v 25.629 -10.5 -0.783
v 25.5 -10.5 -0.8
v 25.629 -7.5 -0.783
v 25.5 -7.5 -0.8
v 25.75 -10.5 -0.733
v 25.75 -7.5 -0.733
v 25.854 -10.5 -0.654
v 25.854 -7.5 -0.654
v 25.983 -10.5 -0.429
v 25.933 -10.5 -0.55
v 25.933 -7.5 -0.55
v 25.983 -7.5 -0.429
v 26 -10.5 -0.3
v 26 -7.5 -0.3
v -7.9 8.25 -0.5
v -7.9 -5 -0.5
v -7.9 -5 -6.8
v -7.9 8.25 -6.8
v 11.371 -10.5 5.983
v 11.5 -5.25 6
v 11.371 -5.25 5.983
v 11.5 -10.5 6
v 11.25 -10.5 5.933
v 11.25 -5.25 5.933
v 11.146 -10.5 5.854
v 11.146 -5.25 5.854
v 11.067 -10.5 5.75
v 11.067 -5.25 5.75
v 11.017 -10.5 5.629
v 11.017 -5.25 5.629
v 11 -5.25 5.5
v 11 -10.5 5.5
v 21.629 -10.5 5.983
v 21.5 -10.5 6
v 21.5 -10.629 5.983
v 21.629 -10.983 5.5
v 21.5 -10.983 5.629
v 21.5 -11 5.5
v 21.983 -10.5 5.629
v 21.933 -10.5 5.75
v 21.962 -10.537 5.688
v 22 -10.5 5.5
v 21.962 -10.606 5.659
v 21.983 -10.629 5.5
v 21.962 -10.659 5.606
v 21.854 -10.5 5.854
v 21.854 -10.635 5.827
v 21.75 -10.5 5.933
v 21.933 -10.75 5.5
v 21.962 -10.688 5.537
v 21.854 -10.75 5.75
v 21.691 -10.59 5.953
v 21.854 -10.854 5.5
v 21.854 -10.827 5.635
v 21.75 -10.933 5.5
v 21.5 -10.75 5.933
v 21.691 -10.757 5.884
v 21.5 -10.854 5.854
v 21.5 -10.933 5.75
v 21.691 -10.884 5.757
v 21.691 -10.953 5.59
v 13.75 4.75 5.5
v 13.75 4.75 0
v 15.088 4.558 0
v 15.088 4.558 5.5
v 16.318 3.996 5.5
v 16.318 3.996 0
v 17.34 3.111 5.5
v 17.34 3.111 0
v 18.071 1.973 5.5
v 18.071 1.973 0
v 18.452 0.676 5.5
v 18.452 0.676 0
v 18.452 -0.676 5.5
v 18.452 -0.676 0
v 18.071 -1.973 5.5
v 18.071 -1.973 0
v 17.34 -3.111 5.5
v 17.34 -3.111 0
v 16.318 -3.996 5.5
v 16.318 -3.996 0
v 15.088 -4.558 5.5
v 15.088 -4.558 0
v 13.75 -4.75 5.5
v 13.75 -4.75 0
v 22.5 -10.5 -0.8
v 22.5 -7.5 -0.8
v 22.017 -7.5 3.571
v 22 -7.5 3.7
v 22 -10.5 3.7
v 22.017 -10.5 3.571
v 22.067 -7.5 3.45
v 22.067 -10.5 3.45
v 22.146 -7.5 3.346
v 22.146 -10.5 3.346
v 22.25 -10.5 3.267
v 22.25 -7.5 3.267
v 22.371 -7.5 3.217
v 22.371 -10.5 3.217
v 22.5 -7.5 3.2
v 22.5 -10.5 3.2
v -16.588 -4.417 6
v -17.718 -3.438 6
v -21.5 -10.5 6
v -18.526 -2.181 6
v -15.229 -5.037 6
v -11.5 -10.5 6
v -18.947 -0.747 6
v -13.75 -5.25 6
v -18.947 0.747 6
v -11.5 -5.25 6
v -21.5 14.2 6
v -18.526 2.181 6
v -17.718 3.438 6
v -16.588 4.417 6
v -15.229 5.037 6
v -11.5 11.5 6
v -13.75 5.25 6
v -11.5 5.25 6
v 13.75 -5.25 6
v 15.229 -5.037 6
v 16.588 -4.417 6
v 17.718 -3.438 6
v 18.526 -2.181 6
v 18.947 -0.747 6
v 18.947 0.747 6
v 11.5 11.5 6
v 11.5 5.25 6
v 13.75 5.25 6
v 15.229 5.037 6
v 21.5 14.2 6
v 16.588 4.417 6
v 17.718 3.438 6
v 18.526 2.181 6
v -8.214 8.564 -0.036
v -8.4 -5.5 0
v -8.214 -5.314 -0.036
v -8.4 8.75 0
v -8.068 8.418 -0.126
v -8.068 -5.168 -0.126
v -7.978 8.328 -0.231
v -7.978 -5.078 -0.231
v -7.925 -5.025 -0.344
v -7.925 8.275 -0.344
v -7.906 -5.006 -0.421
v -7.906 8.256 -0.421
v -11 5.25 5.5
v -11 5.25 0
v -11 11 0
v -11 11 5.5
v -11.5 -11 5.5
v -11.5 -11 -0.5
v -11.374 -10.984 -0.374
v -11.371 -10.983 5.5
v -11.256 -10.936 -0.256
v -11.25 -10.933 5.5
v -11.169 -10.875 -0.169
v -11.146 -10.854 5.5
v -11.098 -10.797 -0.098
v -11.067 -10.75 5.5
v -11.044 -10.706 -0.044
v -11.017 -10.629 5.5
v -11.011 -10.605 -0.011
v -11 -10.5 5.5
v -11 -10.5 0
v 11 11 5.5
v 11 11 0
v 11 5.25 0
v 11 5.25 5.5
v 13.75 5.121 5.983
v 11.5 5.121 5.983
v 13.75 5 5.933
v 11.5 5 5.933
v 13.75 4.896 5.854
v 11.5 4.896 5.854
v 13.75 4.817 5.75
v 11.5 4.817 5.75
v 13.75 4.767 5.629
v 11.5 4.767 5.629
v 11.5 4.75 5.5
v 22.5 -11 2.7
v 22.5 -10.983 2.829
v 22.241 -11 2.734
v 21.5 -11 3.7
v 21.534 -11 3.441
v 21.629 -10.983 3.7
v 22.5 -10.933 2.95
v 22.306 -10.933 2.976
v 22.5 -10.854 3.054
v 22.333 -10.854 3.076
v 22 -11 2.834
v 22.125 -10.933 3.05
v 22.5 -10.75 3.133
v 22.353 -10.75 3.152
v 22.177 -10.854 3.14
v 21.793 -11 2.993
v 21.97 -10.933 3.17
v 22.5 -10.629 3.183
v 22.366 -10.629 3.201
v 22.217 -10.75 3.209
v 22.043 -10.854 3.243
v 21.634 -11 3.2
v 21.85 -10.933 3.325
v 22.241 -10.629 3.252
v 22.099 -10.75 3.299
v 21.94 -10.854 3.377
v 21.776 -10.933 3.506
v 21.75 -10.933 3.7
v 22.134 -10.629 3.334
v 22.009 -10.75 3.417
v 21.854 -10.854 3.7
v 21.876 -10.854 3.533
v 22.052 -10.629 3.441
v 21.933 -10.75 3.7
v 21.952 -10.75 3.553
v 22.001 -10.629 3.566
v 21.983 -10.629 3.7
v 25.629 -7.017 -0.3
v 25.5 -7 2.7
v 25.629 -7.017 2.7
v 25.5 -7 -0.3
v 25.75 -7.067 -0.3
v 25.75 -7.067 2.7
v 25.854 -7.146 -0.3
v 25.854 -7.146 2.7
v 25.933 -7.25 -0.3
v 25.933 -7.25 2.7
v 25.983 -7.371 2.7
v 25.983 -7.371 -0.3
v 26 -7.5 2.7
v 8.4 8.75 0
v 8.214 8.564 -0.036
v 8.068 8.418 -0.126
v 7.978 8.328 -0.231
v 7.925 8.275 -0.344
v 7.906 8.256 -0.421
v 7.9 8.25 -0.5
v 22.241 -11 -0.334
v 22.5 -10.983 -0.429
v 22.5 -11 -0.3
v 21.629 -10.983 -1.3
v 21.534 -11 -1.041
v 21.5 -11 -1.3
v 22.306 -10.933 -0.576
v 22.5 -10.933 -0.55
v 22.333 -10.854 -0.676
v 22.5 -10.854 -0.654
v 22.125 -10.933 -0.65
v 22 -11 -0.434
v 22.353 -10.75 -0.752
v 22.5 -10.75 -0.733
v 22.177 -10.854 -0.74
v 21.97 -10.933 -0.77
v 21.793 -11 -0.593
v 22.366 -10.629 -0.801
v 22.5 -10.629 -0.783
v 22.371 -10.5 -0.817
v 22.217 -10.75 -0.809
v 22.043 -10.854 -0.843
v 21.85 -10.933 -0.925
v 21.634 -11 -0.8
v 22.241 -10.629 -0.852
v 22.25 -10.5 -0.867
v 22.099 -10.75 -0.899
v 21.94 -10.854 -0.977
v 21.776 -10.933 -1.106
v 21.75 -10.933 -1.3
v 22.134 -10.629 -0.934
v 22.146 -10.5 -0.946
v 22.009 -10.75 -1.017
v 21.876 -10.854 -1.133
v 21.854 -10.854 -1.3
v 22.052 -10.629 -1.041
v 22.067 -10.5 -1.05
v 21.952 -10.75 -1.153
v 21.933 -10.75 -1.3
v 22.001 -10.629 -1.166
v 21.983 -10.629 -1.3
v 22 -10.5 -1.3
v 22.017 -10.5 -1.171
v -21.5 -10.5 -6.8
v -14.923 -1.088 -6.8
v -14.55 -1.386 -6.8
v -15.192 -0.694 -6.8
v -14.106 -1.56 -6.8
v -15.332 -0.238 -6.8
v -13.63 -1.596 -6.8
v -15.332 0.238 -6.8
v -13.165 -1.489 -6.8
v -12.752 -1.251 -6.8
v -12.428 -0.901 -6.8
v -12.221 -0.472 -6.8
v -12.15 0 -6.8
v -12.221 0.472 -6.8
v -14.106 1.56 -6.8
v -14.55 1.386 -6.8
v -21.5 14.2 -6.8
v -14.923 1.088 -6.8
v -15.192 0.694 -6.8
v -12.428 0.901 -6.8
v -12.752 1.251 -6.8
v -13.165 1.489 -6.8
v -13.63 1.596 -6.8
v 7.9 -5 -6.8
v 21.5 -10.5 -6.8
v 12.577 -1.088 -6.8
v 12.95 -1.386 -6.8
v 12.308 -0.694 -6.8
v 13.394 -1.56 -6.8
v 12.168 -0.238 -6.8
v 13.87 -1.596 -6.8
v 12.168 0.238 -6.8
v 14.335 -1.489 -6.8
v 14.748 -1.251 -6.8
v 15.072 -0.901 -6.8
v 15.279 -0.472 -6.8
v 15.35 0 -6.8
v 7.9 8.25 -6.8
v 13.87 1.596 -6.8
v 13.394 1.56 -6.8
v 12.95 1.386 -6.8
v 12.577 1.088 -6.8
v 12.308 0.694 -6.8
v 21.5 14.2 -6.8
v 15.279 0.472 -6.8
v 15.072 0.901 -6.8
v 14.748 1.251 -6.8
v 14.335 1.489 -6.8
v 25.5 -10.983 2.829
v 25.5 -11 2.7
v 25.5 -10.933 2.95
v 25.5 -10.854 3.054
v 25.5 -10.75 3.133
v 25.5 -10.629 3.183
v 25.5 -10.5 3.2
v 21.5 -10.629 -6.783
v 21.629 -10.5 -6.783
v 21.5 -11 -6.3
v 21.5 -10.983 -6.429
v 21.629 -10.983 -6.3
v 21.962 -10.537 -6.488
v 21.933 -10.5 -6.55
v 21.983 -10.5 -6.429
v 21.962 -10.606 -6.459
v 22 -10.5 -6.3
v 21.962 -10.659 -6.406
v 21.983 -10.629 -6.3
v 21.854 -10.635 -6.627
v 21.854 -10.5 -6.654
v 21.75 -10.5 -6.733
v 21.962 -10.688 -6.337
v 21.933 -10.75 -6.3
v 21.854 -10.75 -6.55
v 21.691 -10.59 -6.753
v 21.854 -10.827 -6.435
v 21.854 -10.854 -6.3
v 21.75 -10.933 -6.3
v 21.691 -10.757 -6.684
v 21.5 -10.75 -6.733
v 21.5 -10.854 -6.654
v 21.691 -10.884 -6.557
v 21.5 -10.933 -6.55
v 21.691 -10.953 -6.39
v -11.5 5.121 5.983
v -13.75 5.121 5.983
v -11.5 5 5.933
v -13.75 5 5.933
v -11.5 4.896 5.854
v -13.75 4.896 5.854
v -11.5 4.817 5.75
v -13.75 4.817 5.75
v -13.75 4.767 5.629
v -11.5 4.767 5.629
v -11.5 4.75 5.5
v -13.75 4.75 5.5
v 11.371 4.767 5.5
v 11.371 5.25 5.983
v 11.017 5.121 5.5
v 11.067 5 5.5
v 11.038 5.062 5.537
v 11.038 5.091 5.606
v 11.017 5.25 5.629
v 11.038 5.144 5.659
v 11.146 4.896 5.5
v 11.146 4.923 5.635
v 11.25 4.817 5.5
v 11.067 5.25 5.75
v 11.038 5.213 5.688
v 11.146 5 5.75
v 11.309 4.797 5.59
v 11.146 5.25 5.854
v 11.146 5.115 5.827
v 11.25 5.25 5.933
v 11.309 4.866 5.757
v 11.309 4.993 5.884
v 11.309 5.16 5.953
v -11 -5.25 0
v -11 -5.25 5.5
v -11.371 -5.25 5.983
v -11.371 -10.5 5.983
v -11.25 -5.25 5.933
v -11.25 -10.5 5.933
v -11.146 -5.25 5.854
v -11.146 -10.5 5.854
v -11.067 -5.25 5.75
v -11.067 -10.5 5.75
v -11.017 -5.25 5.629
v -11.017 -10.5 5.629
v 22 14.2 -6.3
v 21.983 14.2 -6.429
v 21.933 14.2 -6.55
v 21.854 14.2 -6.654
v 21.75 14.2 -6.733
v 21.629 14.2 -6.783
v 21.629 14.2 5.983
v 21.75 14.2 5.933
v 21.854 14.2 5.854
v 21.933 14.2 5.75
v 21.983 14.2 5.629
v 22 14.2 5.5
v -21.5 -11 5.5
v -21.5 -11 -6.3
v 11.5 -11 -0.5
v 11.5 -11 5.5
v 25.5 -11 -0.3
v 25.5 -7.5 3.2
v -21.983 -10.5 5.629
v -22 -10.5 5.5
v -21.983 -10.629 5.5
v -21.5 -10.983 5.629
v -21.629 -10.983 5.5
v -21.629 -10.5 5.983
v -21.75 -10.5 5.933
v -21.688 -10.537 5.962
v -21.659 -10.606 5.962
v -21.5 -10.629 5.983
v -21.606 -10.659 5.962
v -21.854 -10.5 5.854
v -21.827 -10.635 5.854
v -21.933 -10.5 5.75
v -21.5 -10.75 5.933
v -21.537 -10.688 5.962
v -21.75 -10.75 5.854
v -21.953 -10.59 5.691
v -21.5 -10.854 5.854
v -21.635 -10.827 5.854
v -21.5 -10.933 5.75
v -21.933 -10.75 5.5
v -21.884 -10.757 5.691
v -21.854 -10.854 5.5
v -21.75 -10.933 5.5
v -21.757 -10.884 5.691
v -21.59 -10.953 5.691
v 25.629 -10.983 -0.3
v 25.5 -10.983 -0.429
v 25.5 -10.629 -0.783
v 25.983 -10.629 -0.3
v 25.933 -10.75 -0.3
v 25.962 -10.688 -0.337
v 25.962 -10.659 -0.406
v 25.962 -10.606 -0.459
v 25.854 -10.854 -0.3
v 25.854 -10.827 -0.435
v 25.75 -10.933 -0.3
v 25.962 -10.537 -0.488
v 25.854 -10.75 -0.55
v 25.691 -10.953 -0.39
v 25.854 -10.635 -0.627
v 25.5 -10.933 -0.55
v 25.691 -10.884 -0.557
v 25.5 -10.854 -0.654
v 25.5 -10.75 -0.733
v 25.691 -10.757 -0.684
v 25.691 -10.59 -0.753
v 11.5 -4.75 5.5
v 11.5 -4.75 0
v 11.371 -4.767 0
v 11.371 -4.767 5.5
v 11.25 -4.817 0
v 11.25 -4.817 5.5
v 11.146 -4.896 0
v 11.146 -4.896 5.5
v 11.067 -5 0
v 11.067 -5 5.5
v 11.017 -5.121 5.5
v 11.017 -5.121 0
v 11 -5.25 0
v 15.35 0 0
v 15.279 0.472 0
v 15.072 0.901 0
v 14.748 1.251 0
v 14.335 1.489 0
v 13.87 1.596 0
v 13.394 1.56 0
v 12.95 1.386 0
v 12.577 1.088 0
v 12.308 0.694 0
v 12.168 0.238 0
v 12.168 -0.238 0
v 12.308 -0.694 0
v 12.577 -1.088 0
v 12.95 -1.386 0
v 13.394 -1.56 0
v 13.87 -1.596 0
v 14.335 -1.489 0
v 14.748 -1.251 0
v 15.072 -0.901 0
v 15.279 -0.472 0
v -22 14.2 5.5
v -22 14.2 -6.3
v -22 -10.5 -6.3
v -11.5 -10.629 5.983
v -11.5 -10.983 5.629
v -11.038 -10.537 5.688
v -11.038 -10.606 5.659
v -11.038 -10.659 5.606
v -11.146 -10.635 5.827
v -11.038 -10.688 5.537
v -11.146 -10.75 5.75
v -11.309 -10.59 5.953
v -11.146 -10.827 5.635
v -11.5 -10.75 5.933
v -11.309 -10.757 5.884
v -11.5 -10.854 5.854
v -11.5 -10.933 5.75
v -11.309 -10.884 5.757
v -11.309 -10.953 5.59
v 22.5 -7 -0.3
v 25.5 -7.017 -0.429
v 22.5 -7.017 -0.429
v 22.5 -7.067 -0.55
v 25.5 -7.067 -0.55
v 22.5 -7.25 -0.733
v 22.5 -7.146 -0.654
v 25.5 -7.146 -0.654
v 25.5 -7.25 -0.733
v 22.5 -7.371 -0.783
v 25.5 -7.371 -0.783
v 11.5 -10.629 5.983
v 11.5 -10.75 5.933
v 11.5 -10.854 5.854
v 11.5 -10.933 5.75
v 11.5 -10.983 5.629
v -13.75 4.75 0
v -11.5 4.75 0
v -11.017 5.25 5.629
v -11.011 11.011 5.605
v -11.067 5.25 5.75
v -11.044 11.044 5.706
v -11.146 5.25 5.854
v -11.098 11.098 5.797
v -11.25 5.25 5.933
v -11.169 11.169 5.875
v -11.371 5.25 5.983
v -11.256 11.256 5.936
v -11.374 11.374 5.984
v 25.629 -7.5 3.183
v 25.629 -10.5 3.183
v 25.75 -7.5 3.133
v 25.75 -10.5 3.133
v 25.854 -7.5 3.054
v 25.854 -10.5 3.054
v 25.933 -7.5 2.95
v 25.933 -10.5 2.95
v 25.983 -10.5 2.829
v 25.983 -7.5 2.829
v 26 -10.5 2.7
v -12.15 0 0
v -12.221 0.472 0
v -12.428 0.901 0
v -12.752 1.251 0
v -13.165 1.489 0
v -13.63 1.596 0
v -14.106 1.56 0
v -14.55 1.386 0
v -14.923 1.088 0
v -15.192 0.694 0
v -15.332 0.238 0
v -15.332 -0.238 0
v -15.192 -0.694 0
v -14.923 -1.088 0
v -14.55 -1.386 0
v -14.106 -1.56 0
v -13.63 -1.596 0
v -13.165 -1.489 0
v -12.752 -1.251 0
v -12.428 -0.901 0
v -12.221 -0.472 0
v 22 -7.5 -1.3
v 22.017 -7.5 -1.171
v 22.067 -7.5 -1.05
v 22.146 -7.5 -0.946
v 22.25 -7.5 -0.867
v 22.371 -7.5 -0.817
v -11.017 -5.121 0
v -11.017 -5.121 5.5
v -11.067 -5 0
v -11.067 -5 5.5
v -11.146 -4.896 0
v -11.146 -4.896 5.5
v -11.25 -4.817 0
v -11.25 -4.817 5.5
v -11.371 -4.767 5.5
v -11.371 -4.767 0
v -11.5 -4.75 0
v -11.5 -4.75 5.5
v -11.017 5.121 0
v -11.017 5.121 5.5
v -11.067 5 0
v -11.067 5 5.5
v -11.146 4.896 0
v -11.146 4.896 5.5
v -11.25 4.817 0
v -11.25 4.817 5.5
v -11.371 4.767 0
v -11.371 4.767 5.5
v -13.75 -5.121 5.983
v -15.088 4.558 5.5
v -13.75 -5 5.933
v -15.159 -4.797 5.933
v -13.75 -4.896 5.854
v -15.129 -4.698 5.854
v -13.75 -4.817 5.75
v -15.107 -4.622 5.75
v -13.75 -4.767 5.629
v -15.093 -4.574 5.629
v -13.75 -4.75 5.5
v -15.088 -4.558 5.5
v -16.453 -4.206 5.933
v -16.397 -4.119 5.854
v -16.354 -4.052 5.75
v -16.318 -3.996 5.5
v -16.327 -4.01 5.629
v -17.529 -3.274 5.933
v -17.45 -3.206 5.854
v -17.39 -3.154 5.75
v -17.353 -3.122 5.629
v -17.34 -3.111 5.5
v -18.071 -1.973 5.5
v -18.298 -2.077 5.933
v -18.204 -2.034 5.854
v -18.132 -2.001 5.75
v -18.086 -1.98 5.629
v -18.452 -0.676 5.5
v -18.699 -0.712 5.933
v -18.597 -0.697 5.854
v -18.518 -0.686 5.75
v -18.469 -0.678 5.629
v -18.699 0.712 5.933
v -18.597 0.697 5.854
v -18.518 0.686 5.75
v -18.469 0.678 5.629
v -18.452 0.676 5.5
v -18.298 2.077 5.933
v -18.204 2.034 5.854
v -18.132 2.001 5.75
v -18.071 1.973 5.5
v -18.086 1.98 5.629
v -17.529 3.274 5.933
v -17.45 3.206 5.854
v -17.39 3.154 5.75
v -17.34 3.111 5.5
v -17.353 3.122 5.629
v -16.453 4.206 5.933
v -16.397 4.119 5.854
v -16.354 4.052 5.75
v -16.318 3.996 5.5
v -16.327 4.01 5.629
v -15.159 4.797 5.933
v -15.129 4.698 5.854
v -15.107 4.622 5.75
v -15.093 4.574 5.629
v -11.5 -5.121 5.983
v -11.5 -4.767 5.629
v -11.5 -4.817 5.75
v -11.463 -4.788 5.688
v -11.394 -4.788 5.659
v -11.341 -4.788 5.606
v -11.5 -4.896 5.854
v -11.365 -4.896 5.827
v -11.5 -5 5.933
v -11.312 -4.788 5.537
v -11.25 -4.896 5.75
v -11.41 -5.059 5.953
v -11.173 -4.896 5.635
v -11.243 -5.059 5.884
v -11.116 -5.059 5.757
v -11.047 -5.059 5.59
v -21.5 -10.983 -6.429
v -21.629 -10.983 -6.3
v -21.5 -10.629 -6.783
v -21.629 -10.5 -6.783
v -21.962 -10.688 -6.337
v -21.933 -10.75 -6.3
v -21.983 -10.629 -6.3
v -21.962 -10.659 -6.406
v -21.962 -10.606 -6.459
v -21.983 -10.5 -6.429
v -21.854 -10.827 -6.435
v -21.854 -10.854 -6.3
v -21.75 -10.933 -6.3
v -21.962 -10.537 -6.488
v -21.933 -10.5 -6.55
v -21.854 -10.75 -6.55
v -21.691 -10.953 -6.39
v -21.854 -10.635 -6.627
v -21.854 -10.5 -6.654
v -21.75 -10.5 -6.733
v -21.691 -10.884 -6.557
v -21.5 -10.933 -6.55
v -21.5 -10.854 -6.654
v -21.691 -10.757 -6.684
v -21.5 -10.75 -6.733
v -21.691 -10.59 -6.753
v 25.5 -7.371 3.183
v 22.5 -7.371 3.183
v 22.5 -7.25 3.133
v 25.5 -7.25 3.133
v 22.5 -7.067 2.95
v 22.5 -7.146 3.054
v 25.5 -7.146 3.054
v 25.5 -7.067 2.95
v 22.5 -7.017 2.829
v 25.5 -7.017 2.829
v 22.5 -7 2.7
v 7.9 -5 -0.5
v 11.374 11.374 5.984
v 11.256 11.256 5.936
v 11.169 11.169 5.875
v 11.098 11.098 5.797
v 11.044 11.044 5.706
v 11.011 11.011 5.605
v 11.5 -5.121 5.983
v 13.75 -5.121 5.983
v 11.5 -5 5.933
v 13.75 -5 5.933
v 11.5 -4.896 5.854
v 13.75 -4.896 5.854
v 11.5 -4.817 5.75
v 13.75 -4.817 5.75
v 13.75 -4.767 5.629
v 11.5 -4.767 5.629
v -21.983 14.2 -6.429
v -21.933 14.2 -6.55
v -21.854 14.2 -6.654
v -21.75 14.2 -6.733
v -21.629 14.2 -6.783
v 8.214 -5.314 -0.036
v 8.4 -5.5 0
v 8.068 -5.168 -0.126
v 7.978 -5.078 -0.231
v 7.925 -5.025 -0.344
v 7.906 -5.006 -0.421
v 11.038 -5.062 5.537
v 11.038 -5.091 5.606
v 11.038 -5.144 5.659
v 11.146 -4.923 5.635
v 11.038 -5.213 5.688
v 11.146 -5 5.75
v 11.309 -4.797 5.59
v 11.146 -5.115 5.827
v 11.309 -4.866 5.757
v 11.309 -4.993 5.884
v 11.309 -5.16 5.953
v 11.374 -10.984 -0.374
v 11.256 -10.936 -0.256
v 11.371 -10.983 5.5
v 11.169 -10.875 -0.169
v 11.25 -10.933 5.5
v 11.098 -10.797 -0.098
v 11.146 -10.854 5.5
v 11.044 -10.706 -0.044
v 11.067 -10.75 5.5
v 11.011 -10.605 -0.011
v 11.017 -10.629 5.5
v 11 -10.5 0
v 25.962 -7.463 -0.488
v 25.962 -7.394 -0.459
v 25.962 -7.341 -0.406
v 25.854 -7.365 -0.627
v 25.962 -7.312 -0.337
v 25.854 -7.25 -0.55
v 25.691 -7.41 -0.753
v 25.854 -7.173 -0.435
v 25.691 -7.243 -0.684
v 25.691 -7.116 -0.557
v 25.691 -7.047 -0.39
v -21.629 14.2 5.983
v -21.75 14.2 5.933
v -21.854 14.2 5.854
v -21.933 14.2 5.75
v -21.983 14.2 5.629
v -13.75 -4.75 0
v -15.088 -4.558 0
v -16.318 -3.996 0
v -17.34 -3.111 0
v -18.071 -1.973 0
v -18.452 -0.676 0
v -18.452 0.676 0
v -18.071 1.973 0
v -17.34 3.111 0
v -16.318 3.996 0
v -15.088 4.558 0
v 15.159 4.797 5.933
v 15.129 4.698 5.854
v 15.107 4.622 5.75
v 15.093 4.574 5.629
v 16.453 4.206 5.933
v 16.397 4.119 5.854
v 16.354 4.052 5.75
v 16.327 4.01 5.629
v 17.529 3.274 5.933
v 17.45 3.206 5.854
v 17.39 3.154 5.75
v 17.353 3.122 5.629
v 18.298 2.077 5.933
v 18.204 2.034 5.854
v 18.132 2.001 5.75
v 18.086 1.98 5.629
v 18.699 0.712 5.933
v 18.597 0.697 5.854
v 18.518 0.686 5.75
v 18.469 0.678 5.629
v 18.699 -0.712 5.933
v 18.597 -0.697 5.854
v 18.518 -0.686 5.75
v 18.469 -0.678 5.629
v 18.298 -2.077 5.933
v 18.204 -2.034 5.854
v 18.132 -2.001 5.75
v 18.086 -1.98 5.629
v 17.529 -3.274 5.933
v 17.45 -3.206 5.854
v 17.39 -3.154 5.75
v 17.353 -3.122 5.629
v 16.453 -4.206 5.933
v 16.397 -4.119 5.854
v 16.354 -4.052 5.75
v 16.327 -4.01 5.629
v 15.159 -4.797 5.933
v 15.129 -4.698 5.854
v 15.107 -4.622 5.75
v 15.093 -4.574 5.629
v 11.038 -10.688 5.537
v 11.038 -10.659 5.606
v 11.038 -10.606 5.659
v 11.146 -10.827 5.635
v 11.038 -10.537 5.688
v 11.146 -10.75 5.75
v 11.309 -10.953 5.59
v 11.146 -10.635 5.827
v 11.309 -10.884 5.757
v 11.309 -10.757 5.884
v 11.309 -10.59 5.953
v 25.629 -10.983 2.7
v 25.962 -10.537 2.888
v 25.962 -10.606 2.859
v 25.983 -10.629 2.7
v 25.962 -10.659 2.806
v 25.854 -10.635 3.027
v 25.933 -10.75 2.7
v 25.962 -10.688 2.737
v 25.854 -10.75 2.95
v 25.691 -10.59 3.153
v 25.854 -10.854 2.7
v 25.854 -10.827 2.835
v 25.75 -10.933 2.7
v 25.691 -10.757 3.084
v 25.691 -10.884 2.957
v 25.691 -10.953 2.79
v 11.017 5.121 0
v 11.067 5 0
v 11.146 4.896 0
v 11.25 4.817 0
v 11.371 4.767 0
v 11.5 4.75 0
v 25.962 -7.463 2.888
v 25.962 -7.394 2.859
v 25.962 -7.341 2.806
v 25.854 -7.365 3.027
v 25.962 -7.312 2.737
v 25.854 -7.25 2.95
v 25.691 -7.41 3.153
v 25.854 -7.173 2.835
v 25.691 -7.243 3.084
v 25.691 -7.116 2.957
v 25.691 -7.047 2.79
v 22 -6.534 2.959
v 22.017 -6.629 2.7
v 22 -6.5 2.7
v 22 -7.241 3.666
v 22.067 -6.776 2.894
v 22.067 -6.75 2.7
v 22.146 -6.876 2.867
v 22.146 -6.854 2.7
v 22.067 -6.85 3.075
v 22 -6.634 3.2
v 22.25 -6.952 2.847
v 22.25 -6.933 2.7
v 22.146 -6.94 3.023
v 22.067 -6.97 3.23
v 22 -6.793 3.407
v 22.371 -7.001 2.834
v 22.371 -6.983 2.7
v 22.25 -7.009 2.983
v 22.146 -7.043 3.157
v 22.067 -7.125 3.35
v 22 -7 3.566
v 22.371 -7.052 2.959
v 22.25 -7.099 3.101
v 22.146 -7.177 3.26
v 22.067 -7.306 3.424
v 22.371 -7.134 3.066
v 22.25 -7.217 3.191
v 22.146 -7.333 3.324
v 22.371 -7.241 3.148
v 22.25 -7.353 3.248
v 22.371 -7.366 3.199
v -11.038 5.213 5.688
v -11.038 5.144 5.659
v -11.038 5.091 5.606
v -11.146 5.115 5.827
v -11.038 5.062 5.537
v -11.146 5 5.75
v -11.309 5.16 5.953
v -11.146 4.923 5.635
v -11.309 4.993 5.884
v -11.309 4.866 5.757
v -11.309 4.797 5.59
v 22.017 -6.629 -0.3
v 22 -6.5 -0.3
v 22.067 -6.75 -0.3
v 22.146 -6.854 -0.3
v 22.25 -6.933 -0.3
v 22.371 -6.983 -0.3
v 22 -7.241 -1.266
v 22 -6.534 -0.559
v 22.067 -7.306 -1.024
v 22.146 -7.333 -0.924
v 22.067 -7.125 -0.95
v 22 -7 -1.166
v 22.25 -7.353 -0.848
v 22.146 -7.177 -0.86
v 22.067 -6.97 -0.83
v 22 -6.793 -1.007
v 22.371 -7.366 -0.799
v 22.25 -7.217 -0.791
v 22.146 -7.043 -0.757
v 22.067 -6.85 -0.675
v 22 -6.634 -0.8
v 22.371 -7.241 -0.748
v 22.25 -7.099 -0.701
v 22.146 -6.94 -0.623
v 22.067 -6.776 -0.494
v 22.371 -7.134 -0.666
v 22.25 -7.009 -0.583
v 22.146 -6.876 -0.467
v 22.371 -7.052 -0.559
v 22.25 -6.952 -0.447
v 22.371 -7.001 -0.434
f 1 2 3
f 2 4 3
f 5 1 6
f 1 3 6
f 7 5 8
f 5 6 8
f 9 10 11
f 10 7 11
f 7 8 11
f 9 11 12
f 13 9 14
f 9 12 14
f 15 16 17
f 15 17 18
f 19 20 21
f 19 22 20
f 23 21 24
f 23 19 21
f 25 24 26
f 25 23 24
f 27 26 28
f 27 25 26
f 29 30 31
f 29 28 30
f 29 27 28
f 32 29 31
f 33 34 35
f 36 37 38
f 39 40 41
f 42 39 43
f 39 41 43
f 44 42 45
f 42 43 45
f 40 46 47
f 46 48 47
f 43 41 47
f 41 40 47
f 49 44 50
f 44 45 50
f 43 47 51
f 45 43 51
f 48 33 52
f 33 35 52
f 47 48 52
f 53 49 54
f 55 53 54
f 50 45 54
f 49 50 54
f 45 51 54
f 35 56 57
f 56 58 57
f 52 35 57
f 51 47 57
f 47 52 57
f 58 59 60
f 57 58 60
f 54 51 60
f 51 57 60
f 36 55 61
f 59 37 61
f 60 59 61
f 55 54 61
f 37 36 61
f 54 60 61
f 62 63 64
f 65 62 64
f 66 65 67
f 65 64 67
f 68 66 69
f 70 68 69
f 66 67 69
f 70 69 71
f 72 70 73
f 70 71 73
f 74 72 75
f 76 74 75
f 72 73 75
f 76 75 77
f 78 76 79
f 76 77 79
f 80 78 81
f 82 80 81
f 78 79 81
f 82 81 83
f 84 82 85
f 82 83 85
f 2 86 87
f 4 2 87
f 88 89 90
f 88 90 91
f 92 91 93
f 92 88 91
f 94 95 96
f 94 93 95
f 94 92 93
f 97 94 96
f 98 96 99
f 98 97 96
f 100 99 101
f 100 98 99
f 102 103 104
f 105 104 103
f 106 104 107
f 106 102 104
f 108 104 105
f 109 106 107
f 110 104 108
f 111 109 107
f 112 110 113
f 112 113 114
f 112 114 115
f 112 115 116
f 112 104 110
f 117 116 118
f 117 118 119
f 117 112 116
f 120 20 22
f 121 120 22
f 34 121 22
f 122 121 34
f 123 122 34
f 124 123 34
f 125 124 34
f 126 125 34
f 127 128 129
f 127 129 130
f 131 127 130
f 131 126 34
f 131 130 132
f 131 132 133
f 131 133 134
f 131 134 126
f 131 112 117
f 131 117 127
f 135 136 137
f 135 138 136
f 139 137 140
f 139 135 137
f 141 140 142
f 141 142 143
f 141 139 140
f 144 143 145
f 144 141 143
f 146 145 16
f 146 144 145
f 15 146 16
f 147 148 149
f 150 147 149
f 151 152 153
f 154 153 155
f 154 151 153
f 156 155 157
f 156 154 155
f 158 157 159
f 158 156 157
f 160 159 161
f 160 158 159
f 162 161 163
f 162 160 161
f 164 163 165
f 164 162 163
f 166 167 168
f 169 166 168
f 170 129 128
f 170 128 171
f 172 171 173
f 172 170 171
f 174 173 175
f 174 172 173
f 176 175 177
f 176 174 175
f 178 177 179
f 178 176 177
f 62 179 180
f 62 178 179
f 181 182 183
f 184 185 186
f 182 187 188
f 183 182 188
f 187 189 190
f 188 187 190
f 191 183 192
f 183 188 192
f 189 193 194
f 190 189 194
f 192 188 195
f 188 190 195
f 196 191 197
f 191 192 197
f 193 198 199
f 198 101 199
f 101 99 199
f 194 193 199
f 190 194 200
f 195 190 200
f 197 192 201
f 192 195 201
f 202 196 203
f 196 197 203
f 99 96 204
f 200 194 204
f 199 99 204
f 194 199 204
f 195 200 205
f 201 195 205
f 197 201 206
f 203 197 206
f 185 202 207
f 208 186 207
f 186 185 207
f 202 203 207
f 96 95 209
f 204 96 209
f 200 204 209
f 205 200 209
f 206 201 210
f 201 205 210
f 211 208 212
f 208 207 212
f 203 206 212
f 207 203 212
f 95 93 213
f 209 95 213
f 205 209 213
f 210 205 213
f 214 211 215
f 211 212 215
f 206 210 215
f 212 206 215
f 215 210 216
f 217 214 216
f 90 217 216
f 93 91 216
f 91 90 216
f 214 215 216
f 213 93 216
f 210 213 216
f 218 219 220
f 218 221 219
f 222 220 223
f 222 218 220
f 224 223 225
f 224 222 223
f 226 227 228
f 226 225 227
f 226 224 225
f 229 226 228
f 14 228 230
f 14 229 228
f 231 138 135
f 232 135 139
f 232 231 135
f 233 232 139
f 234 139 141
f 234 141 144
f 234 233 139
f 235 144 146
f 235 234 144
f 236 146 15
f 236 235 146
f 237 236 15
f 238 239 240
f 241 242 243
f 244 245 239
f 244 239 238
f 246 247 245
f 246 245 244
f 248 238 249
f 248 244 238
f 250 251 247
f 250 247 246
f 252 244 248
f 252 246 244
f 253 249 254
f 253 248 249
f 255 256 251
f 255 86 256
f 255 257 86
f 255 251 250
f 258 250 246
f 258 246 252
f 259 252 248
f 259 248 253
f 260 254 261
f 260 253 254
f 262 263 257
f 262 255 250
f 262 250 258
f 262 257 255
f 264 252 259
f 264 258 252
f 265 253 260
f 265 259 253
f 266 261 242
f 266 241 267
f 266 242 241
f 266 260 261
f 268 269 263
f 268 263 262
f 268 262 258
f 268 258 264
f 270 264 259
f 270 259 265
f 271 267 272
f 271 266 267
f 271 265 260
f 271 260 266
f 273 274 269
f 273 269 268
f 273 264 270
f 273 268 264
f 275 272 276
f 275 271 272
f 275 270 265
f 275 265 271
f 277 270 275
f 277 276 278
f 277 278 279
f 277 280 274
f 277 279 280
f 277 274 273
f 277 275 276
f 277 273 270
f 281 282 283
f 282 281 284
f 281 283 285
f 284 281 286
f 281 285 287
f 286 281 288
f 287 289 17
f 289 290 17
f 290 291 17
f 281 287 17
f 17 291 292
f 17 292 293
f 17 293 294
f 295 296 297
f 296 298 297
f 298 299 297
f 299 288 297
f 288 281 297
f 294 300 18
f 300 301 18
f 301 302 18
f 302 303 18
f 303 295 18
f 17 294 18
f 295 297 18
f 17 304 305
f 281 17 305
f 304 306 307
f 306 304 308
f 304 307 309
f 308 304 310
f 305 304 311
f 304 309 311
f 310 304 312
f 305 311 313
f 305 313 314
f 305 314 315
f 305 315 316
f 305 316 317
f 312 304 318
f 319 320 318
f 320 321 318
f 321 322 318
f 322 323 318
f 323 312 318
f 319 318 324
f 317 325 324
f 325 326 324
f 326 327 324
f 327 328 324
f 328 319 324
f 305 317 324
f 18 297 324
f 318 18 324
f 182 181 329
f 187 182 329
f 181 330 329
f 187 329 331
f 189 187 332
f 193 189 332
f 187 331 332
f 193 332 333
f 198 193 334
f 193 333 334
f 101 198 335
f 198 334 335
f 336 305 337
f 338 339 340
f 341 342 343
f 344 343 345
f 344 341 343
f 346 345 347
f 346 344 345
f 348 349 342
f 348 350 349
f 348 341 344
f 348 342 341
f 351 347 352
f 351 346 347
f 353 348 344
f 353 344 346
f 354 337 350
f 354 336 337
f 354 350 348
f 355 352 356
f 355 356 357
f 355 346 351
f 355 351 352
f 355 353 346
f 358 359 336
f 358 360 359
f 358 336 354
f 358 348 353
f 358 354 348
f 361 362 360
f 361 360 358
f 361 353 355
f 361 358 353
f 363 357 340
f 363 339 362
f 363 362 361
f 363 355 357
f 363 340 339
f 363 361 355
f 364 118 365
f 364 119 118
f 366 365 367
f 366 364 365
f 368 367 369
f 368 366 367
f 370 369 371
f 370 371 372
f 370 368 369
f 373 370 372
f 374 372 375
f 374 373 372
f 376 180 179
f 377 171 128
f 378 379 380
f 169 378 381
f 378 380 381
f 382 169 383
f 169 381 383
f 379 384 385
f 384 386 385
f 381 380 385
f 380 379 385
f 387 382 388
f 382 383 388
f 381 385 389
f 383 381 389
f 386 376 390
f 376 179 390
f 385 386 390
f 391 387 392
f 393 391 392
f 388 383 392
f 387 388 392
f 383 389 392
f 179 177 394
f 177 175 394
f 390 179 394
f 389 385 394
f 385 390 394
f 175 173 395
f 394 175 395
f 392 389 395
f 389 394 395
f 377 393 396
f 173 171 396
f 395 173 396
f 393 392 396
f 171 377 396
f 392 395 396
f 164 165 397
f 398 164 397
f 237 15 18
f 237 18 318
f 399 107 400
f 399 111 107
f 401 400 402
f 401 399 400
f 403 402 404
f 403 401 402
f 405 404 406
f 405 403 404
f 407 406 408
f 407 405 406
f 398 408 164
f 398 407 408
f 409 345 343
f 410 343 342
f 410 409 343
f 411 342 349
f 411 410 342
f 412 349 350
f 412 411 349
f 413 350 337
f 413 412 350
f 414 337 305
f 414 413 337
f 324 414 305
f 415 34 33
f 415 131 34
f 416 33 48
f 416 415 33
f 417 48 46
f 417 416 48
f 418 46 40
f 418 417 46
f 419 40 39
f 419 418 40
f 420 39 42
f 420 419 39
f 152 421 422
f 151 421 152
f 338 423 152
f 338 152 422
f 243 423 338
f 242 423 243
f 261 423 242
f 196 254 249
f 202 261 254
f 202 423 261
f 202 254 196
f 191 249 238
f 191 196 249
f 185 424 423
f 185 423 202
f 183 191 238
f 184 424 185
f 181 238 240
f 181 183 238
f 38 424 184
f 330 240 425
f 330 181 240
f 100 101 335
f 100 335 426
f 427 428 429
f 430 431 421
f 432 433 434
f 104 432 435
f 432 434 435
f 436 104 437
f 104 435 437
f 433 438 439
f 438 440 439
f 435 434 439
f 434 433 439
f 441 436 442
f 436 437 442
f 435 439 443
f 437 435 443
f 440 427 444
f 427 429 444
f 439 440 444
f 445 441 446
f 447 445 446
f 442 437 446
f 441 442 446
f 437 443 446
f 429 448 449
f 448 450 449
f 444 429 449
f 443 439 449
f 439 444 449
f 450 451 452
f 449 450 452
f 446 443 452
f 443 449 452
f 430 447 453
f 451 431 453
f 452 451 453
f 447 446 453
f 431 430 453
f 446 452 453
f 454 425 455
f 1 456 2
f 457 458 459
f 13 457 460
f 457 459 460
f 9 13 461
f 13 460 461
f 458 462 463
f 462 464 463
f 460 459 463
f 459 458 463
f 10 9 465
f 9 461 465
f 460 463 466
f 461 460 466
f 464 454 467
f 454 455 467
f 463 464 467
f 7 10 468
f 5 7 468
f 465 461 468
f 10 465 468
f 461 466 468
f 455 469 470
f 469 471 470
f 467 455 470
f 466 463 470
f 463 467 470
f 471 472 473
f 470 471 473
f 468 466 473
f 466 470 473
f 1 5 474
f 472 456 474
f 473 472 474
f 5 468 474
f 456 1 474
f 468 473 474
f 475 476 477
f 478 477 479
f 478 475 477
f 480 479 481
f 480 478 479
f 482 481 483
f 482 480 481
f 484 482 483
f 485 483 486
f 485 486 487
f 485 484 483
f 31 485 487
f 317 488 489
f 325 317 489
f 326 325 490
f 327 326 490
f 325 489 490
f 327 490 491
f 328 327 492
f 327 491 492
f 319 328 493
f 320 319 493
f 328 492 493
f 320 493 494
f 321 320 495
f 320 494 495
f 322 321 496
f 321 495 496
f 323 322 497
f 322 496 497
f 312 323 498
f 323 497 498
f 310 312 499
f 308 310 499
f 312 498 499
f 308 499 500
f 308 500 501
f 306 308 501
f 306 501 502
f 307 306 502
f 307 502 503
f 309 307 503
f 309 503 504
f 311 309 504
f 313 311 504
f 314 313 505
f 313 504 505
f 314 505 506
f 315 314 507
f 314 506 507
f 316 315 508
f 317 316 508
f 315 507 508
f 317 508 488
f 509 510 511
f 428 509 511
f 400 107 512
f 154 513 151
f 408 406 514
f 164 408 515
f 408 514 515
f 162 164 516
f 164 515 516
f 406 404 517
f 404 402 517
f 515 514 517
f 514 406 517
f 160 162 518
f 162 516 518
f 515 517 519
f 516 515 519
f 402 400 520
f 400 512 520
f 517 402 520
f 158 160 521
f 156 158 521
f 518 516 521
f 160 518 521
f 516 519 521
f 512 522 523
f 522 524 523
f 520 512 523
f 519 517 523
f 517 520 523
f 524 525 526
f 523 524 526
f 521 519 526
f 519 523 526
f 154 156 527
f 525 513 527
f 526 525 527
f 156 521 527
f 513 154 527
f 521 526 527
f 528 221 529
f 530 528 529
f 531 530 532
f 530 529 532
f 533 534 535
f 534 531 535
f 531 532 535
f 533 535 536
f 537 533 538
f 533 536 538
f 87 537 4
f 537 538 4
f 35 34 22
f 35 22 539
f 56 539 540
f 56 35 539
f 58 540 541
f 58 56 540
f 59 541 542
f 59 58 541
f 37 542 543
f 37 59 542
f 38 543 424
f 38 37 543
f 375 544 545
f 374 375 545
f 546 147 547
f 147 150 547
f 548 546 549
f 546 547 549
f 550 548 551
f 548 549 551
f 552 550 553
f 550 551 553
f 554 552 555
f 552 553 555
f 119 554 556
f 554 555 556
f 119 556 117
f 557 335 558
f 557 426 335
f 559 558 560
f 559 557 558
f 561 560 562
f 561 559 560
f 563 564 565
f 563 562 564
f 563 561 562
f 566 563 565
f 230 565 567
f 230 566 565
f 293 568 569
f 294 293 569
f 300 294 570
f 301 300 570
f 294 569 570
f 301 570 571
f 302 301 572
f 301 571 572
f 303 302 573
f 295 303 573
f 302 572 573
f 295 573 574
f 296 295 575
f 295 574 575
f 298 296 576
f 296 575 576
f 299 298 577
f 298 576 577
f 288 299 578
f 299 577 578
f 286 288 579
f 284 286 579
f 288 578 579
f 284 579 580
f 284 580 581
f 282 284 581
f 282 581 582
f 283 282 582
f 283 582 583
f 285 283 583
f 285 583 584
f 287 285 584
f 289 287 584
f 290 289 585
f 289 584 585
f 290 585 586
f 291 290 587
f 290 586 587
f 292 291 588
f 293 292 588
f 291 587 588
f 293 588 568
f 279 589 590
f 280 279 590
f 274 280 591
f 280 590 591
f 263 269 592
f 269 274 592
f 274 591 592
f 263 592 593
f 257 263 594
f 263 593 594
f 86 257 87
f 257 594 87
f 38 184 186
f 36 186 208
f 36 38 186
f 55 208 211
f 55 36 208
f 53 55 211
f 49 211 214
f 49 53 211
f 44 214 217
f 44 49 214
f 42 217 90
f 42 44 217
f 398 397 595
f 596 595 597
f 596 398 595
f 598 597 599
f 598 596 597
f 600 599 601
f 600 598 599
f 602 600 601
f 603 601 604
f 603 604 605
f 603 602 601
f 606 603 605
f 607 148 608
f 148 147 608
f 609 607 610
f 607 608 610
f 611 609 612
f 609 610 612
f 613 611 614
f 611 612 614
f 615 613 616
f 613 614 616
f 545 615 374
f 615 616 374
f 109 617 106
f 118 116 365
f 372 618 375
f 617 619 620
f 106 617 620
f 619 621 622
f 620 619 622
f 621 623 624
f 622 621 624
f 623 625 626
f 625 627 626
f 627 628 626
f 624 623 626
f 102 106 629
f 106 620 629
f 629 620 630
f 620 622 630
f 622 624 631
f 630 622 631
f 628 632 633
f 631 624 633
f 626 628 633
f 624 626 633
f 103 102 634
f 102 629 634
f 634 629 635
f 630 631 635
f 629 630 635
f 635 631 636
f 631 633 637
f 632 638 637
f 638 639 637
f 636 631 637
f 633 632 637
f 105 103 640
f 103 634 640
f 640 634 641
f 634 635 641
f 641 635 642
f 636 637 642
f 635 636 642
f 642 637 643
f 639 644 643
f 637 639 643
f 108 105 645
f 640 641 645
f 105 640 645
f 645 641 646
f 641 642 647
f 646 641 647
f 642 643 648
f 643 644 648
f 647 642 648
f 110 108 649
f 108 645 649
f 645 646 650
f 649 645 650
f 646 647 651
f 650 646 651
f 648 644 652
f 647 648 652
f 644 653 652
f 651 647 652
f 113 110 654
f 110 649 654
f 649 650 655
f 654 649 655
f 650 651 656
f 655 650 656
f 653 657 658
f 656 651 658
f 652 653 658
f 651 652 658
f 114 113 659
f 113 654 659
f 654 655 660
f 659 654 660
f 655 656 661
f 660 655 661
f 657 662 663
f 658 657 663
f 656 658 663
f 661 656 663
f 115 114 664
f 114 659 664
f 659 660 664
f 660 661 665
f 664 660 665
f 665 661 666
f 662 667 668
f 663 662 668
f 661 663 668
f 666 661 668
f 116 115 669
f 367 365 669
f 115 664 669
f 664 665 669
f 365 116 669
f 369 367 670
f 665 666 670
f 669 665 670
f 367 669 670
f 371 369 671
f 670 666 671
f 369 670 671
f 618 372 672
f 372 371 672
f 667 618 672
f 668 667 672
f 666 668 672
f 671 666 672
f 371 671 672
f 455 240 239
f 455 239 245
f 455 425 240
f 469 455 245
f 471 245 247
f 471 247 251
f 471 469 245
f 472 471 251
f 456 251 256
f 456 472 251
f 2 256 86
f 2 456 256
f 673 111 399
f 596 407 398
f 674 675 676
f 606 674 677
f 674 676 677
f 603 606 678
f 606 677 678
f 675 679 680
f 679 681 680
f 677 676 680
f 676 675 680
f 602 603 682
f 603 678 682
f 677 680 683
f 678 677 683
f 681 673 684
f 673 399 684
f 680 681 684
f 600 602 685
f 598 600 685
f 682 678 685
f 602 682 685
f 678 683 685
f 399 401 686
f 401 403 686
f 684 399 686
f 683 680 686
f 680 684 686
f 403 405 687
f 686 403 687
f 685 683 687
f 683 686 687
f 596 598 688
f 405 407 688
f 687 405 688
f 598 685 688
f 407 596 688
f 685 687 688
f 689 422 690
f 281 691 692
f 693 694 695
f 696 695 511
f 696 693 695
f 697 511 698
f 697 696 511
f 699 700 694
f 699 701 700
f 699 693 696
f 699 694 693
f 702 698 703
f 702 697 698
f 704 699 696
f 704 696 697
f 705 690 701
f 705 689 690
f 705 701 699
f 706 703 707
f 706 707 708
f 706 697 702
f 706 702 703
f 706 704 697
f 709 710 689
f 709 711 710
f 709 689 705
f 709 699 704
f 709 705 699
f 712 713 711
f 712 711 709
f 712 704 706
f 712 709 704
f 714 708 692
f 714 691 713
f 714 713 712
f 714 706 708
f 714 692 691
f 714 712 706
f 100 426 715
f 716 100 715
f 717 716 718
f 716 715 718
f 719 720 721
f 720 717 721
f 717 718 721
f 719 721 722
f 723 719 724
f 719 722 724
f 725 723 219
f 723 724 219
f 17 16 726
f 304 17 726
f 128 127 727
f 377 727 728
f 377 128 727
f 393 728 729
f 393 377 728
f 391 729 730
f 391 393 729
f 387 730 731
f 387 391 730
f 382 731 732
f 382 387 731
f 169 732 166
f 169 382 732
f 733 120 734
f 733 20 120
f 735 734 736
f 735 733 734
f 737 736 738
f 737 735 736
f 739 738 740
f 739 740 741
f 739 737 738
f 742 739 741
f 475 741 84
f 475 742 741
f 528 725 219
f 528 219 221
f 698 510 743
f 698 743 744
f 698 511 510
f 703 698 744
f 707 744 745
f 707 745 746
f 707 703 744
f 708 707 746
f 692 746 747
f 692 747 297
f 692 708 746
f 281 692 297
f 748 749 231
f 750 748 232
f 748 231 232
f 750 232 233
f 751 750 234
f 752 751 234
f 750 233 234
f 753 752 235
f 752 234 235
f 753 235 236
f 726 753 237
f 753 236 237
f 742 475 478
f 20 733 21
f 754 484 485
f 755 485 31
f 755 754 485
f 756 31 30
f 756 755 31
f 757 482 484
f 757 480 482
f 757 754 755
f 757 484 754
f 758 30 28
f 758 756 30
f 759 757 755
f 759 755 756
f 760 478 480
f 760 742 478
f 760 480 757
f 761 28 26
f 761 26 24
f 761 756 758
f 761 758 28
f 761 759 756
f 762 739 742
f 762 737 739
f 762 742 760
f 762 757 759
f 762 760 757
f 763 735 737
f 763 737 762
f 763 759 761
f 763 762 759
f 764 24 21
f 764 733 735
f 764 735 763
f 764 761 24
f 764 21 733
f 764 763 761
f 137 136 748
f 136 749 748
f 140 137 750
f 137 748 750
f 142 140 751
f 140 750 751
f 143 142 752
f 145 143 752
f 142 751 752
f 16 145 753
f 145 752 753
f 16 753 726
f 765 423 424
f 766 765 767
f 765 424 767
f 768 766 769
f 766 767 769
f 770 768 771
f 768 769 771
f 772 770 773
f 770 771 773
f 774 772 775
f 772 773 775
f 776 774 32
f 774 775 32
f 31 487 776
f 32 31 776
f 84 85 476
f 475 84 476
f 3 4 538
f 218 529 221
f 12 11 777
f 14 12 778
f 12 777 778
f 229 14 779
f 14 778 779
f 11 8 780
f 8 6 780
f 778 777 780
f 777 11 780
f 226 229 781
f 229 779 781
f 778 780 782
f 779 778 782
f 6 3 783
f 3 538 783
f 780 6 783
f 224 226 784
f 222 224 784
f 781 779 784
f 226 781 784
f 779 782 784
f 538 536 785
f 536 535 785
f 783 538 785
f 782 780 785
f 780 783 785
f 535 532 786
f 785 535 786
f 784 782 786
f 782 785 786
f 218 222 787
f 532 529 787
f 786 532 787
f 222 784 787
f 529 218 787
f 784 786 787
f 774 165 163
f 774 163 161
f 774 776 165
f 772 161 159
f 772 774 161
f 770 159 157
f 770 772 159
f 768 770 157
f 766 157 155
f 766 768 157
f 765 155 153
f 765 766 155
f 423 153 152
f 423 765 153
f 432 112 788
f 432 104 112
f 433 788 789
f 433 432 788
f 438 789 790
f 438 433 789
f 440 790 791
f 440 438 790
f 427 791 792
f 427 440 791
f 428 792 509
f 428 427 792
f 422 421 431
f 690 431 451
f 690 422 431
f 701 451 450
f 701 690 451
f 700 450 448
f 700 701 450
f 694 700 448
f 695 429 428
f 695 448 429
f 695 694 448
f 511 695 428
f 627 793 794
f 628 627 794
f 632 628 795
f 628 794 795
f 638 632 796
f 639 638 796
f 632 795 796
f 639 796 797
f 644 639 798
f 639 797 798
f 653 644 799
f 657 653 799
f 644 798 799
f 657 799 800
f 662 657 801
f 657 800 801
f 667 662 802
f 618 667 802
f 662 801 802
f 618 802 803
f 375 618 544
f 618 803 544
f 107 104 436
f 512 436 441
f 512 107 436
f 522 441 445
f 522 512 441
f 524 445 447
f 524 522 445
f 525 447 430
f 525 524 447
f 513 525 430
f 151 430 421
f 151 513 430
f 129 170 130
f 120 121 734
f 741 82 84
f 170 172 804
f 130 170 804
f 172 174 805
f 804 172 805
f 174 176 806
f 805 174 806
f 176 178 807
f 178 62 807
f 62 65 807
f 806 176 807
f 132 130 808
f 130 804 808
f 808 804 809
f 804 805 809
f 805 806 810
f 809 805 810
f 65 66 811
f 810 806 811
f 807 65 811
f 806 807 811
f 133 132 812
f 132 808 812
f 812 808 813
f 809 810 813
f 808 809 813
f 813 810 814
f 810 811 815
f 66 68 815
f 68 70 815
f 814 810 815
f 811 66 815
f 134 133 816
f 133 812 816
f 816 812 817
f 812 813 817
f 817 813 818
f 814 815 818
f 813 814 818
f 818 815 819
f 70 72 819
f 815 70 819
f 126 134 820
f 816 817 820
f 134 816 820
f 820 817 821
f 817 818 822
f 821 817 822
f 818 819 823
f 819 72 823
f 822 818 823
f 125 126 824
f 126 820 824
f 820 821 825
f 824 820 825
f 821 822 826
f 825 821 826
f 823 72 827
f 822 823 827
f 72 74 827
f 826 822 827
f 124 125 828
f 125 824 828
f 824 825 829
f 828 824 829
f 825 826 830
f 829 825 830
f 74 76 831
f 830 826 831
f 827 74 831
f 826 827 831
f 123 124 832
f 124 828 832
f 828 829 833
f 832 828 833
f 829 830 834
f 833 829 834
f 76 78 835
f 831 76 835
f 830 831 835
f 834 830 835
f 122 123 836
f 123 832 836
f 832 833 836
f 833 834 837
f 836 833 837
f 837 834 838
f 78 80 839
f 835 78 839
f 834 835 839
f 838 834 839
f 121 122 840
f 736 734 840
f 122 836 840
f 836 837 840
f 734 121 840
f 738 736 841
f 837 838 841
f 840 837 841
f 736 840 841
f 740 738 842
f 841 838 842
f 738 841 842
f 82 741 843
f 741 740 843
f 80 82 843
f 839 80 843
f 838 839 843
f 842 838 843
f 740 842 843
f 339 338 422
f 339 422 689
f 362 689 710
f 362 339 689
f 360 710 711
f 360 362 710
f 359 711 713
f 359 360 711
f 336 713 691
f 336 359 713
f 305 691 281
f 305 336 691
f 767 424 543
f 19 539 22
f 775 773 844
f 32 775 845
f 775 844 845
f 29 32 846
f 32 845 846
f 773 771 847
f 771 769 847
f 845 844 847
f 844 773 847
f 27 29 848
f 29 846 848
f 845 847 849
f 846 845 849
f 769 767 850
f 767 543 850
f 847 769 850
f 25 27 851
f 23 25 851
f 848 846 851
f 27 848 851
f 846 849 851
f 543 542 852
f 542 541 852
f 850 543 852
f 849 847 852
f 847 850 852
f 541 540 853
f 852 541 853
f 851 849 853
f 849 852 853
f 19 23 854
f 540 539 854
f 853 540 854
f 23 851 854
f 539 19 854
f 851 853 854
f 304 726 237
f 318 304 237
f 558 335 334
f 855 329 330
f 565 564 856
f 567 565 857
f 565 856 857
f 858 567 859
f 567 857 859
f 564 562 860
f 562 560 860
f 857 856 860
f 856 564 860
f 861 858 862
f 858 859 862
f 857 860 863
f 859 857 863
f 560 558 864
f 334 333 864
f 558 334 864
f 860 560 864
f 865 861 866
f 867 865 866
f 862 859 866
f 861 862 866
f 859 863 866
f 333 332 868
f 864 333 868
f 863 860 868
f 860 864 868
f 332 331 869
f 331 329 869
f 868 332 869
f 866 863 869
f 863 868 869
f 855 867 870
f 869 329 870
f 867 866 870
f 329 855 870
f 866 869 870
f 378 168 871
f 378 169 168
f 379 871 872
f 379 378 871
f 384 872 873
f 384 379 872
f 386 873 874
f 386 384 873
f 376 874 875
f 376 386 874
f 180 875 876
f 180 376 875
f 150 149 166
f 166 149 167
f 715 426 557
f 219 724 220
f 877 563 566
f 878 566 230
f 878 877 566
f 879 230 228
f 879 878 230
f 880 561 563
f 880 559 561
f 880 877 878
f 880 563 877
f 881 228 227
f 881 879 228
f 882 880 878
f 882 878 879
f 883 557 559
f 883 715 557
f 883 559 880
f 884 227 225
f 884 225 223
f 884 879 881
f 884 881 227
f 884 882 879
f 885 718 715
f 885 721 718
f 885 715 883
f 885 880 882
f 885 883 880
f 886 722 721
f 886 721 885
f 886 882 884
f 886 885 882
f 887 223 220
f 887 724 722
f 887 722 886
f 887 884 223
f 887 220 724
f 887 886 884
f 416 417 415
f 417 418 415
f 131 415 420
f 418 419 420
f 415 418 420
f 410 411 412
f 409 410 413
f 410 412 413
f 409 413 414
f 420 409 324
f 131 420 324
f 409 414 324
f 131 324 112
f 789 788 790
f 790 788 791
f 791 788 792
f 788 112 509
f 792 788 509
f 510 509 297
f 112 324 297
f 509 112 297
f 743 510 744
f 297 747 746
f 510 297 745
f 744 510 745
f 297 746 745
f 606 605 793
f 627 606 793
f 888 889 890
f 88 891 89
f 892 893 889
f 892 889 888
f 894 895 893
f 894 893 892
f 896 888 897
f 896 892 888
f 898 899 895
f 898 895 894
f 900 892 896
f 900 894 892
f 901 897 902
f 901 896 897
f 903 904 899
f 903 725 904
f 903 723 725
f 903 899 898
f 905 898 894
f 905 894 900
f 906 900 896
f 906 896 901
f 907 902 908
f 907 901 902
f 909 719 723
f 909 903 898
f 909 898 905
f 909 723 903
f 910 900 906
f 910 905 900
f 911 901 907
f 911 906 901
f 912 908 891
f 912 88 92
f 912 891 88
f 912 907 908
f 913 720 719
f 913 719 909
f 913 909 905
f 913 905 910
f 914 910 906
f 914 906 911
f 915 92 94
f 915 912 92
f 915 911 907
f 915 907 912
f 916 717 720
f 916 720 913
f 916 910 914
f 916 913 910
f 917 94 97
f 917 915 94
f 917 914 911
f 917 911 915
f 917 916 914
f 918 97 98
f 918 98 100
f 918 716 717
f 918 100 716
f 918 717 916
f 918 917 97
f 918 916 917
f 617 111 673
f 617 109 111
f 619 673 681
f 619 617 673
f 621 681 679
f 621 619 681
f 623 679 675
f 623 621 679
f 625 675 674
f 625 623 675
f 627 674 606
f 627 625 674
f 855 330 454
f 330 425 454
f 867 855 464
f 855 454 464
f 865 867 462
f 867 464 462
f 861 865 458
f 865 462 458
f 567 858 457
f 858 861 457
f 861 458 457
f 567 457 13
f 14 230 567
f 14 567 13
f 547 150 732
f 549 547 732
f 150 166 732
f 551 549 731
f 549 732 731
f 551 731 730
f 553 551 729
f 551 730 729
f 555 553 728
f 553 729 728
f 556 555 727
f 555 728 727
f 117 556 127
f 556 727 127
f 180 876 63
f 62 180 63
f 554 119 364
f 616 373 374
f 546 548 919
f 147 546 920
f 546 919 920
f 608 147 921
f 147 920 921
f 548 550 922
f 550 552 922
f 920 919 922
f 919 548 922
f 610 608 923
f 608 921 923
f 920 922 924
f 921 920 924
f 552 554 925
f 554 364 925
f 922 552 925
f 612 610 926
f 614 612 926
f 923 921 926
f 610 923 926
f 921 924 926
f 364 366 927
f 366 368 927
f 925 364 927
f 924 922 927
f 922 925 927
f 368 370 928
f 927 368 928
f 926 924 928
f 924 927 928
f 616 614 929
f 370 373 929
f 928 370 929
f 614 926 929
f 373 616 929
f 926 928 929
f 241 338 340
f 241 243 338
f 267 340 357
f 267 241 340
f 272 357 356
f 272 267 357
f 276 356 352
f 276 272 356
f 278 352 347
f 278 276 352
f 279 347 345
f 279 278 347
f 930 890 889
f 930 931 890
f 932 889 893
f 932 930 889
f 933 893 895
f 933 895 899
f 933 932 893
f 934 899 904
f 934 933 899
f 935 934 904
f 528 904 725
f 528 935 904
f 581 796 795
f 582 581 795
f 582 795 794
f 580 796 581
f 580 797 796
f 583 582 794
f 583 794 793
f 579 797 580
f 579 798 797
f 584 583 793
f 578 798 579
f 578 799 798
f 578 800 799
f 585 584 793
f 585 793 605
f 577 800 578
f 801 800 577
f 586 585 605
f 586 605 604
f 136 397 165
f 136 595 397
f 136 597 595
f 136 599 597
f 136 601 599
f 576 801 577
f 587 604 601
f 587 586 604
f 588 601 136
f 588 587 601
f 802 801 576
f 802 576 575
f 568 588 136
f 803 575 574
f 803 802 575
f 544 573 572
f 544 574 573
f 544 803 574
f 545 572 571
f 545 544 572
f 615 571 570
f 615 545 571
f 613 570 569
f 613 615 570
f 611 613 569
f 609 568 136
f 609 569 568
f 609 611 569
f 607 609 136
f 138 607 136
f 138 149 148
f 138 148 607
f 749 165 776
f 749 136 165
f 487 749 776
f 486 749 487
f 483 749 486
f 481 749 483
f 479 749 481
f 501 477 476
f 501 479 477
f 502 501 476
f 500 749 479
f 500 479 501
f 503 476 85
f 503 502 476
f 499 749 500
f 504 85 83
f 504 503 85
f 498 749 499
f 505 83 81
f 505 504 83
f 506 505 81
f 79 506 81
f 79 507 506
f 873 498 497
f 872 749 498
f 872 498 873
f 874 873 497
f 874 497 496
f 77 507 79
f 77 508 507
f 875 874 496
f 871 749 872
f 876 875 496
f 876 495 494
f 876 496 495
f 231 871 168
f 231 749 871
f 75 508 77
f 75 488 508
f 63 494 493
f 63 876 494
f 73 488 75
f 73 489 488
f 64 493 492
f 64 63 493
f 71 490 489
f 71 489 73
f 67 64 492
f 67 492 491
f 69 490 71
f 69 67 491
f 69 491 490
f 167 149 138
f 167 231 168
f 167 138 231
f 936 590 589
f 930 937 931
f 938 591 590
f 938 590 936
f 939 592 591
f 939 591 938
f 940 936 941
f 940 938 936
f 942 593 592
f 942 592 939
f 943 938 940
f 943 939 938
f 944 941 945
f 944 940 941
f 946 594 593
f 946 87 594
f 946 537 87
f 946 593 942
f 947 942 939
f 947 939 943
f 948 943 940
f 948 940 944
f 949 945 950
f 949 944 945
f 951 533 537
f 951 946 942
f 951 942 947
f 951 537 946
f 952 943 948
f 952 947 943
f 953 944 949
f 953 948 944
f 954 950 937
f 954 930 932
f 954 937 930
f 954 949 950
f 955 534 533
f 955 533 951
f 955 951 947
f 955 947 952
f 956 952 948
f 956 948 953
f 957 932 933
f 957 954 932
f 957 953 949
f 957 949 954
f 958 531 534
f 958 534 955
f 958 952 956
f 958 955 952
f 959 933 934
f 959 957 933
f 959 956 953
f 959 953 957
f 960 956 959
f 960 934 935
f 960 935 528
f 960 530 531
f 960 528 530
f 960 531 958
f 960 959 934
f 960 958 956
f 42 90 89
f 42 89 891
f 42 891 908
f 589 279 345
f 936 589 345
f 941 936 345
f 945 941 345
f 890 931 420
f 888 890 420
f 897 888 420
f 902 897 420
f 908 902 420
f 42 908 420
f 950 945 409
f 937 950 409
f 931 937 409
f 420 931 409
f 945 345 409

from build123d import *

# Parameters (mm, degrees)
SKETCH1_W           = 44
SKETCH1_H           = 25.2
SKETCH1_R           = 1.6
SKETCH1_W_2         = 15.8
SKETCH1_H_2         = 13.25
BOSS_EXTRUDE1_DEPTH = 6.8
BOSS_EXTRUDE4_DEPTH = 6
SKETCH6_W           = 4
SKETCH6_H           = 4
BOSS_EXTRUDE6_DEPTH = 4
FILLET1_R           = 0.5


with BuildPart() as part:
    # Sketch1 → Boss-Extrude1 (new body)
    with BuildSketch(Plane.XY):
        with Locations((0, 1.6)):
            Rectangle(SKETCH1_W, SKETCH1_H)
        with Locations((13.75, 0)):
            Circle(SKETCH1_R, mode=Mode.SUBTRACT)
        with Locations((0, 1.625)):
            Rectangle(SKETCH1_W_2, SKETCH1_H_2, mode=Mode.SUBTRACT)
        with Locations((-13.75, 0)):
            Circle(SKETCH1_R, mode=Mode.SUBTRACT)
    extrude(amount=-BOSS_EXTRUDE1_DEPTH)

    # Sketch1<3> → Boss-Extrude4 (add)
    with BuildSketch(Plane.XY):
        with BuildLine():
            Line((-11, 4.75), (-11, 11))
            Line((-11, 11), (11, 11))
            Line((11, 11), (11, 4.75))
            Line((11, 4.75), (13.75, 4.75))
            ThreePointArc((13.75, 4.75), (18.5, 0), (13.75, -4.75))
            Line((13.75, -4.75), (11, -4.75))
            Line((11, -4.75), (11, -11))
            Line((11, -11), (22, -11))
            Line((22, -11), (22, 14.2))
            Line((22, 14.2), (-22, 14.2))
            Line((-22, 14.2), (-22, -11))
            Line((-22, -11), (-11, -11))
            Line((-11, -11), (-11, -4.75))
            Line((-11, -4.75), (-13.75, -4.75))
            ThreePointArc((-13.75, -4.75), (-18.5, 0), (-13.75, 4.75))
            Line((-13.75, 4.75), (-11, 4.75))
        make_face()
    extrude(amount=BOSS_EXTRUDE4_DEPTH)

    # Sketch6 → Boss-Extrude6 (add)
    with BuildSketch(Plane(origin=(22, 0, 0), x_dir=(0, 0, -1), z_dir=(1, 0, 0))):
        with Locations((-1.2, -9)):
            Rectangle(SKETCH6_W, SKETCH6_H)
    extrude(amount=BOSS_EXTRUDE6_DEPTH)

    # Fillet1
    fillet1_edges = [part.edges().sort_by_distance(p)[0] for p in [
        (22, -7, 1.2),
        (24, -11, 3.2),
        (24, -11, -0.8),
        (26, -9, -0.8),
        (24, -7, -0.8),
        (22, -9, -0.8),
        (24, -7, 3.2),
        (22, -9, 3.2),
        (26, -9, 3.2),
        (26, -7, 1.2),
        (26, -11, 1.2),
        (22, 1.6, 6),
        (22, -11, 4.6),
        (22, -11, -3.8),
        (-22, 1.6, 6),
        (-22, -11, -0.4),
        (0, -11, -6.8),
        (22, 1.6, -6.8),
        (-22, 1.6, -6.8),
        (-12.375, 4.75, 6),
        (-18.5, 0, 6),
        (12.375, -4.75, 6),
        (18.5, 0, 6),
        (-7.9, 1.625, 0),
        (0, -5, 0),
        (7.9, 1.625, 0),
        (0, 8.25, 0),
        (-16.5, -11, 6),
        (16.5, -11, 6),
        (-11, 7.875, 6),
        (-12.375, -4.75, 6),
        (-11, -7.875, 6),
        (11, -7.875, 6),
        (12.375, 4.75, 6),
        (11, 7.875, 6),
        (0, 11, 6),
        (11, -4.75, 3),
        (-11, -4.75, 3),
        (-11, 4.75, 3),
        (11, 4.75, 3),
        (-11, -11, 3),
        (0, -11, 0),
        (11, -11, 3),
    ]]
    fillet(fillet1_edges, radius=FILLET1_R)


solid = part.part
